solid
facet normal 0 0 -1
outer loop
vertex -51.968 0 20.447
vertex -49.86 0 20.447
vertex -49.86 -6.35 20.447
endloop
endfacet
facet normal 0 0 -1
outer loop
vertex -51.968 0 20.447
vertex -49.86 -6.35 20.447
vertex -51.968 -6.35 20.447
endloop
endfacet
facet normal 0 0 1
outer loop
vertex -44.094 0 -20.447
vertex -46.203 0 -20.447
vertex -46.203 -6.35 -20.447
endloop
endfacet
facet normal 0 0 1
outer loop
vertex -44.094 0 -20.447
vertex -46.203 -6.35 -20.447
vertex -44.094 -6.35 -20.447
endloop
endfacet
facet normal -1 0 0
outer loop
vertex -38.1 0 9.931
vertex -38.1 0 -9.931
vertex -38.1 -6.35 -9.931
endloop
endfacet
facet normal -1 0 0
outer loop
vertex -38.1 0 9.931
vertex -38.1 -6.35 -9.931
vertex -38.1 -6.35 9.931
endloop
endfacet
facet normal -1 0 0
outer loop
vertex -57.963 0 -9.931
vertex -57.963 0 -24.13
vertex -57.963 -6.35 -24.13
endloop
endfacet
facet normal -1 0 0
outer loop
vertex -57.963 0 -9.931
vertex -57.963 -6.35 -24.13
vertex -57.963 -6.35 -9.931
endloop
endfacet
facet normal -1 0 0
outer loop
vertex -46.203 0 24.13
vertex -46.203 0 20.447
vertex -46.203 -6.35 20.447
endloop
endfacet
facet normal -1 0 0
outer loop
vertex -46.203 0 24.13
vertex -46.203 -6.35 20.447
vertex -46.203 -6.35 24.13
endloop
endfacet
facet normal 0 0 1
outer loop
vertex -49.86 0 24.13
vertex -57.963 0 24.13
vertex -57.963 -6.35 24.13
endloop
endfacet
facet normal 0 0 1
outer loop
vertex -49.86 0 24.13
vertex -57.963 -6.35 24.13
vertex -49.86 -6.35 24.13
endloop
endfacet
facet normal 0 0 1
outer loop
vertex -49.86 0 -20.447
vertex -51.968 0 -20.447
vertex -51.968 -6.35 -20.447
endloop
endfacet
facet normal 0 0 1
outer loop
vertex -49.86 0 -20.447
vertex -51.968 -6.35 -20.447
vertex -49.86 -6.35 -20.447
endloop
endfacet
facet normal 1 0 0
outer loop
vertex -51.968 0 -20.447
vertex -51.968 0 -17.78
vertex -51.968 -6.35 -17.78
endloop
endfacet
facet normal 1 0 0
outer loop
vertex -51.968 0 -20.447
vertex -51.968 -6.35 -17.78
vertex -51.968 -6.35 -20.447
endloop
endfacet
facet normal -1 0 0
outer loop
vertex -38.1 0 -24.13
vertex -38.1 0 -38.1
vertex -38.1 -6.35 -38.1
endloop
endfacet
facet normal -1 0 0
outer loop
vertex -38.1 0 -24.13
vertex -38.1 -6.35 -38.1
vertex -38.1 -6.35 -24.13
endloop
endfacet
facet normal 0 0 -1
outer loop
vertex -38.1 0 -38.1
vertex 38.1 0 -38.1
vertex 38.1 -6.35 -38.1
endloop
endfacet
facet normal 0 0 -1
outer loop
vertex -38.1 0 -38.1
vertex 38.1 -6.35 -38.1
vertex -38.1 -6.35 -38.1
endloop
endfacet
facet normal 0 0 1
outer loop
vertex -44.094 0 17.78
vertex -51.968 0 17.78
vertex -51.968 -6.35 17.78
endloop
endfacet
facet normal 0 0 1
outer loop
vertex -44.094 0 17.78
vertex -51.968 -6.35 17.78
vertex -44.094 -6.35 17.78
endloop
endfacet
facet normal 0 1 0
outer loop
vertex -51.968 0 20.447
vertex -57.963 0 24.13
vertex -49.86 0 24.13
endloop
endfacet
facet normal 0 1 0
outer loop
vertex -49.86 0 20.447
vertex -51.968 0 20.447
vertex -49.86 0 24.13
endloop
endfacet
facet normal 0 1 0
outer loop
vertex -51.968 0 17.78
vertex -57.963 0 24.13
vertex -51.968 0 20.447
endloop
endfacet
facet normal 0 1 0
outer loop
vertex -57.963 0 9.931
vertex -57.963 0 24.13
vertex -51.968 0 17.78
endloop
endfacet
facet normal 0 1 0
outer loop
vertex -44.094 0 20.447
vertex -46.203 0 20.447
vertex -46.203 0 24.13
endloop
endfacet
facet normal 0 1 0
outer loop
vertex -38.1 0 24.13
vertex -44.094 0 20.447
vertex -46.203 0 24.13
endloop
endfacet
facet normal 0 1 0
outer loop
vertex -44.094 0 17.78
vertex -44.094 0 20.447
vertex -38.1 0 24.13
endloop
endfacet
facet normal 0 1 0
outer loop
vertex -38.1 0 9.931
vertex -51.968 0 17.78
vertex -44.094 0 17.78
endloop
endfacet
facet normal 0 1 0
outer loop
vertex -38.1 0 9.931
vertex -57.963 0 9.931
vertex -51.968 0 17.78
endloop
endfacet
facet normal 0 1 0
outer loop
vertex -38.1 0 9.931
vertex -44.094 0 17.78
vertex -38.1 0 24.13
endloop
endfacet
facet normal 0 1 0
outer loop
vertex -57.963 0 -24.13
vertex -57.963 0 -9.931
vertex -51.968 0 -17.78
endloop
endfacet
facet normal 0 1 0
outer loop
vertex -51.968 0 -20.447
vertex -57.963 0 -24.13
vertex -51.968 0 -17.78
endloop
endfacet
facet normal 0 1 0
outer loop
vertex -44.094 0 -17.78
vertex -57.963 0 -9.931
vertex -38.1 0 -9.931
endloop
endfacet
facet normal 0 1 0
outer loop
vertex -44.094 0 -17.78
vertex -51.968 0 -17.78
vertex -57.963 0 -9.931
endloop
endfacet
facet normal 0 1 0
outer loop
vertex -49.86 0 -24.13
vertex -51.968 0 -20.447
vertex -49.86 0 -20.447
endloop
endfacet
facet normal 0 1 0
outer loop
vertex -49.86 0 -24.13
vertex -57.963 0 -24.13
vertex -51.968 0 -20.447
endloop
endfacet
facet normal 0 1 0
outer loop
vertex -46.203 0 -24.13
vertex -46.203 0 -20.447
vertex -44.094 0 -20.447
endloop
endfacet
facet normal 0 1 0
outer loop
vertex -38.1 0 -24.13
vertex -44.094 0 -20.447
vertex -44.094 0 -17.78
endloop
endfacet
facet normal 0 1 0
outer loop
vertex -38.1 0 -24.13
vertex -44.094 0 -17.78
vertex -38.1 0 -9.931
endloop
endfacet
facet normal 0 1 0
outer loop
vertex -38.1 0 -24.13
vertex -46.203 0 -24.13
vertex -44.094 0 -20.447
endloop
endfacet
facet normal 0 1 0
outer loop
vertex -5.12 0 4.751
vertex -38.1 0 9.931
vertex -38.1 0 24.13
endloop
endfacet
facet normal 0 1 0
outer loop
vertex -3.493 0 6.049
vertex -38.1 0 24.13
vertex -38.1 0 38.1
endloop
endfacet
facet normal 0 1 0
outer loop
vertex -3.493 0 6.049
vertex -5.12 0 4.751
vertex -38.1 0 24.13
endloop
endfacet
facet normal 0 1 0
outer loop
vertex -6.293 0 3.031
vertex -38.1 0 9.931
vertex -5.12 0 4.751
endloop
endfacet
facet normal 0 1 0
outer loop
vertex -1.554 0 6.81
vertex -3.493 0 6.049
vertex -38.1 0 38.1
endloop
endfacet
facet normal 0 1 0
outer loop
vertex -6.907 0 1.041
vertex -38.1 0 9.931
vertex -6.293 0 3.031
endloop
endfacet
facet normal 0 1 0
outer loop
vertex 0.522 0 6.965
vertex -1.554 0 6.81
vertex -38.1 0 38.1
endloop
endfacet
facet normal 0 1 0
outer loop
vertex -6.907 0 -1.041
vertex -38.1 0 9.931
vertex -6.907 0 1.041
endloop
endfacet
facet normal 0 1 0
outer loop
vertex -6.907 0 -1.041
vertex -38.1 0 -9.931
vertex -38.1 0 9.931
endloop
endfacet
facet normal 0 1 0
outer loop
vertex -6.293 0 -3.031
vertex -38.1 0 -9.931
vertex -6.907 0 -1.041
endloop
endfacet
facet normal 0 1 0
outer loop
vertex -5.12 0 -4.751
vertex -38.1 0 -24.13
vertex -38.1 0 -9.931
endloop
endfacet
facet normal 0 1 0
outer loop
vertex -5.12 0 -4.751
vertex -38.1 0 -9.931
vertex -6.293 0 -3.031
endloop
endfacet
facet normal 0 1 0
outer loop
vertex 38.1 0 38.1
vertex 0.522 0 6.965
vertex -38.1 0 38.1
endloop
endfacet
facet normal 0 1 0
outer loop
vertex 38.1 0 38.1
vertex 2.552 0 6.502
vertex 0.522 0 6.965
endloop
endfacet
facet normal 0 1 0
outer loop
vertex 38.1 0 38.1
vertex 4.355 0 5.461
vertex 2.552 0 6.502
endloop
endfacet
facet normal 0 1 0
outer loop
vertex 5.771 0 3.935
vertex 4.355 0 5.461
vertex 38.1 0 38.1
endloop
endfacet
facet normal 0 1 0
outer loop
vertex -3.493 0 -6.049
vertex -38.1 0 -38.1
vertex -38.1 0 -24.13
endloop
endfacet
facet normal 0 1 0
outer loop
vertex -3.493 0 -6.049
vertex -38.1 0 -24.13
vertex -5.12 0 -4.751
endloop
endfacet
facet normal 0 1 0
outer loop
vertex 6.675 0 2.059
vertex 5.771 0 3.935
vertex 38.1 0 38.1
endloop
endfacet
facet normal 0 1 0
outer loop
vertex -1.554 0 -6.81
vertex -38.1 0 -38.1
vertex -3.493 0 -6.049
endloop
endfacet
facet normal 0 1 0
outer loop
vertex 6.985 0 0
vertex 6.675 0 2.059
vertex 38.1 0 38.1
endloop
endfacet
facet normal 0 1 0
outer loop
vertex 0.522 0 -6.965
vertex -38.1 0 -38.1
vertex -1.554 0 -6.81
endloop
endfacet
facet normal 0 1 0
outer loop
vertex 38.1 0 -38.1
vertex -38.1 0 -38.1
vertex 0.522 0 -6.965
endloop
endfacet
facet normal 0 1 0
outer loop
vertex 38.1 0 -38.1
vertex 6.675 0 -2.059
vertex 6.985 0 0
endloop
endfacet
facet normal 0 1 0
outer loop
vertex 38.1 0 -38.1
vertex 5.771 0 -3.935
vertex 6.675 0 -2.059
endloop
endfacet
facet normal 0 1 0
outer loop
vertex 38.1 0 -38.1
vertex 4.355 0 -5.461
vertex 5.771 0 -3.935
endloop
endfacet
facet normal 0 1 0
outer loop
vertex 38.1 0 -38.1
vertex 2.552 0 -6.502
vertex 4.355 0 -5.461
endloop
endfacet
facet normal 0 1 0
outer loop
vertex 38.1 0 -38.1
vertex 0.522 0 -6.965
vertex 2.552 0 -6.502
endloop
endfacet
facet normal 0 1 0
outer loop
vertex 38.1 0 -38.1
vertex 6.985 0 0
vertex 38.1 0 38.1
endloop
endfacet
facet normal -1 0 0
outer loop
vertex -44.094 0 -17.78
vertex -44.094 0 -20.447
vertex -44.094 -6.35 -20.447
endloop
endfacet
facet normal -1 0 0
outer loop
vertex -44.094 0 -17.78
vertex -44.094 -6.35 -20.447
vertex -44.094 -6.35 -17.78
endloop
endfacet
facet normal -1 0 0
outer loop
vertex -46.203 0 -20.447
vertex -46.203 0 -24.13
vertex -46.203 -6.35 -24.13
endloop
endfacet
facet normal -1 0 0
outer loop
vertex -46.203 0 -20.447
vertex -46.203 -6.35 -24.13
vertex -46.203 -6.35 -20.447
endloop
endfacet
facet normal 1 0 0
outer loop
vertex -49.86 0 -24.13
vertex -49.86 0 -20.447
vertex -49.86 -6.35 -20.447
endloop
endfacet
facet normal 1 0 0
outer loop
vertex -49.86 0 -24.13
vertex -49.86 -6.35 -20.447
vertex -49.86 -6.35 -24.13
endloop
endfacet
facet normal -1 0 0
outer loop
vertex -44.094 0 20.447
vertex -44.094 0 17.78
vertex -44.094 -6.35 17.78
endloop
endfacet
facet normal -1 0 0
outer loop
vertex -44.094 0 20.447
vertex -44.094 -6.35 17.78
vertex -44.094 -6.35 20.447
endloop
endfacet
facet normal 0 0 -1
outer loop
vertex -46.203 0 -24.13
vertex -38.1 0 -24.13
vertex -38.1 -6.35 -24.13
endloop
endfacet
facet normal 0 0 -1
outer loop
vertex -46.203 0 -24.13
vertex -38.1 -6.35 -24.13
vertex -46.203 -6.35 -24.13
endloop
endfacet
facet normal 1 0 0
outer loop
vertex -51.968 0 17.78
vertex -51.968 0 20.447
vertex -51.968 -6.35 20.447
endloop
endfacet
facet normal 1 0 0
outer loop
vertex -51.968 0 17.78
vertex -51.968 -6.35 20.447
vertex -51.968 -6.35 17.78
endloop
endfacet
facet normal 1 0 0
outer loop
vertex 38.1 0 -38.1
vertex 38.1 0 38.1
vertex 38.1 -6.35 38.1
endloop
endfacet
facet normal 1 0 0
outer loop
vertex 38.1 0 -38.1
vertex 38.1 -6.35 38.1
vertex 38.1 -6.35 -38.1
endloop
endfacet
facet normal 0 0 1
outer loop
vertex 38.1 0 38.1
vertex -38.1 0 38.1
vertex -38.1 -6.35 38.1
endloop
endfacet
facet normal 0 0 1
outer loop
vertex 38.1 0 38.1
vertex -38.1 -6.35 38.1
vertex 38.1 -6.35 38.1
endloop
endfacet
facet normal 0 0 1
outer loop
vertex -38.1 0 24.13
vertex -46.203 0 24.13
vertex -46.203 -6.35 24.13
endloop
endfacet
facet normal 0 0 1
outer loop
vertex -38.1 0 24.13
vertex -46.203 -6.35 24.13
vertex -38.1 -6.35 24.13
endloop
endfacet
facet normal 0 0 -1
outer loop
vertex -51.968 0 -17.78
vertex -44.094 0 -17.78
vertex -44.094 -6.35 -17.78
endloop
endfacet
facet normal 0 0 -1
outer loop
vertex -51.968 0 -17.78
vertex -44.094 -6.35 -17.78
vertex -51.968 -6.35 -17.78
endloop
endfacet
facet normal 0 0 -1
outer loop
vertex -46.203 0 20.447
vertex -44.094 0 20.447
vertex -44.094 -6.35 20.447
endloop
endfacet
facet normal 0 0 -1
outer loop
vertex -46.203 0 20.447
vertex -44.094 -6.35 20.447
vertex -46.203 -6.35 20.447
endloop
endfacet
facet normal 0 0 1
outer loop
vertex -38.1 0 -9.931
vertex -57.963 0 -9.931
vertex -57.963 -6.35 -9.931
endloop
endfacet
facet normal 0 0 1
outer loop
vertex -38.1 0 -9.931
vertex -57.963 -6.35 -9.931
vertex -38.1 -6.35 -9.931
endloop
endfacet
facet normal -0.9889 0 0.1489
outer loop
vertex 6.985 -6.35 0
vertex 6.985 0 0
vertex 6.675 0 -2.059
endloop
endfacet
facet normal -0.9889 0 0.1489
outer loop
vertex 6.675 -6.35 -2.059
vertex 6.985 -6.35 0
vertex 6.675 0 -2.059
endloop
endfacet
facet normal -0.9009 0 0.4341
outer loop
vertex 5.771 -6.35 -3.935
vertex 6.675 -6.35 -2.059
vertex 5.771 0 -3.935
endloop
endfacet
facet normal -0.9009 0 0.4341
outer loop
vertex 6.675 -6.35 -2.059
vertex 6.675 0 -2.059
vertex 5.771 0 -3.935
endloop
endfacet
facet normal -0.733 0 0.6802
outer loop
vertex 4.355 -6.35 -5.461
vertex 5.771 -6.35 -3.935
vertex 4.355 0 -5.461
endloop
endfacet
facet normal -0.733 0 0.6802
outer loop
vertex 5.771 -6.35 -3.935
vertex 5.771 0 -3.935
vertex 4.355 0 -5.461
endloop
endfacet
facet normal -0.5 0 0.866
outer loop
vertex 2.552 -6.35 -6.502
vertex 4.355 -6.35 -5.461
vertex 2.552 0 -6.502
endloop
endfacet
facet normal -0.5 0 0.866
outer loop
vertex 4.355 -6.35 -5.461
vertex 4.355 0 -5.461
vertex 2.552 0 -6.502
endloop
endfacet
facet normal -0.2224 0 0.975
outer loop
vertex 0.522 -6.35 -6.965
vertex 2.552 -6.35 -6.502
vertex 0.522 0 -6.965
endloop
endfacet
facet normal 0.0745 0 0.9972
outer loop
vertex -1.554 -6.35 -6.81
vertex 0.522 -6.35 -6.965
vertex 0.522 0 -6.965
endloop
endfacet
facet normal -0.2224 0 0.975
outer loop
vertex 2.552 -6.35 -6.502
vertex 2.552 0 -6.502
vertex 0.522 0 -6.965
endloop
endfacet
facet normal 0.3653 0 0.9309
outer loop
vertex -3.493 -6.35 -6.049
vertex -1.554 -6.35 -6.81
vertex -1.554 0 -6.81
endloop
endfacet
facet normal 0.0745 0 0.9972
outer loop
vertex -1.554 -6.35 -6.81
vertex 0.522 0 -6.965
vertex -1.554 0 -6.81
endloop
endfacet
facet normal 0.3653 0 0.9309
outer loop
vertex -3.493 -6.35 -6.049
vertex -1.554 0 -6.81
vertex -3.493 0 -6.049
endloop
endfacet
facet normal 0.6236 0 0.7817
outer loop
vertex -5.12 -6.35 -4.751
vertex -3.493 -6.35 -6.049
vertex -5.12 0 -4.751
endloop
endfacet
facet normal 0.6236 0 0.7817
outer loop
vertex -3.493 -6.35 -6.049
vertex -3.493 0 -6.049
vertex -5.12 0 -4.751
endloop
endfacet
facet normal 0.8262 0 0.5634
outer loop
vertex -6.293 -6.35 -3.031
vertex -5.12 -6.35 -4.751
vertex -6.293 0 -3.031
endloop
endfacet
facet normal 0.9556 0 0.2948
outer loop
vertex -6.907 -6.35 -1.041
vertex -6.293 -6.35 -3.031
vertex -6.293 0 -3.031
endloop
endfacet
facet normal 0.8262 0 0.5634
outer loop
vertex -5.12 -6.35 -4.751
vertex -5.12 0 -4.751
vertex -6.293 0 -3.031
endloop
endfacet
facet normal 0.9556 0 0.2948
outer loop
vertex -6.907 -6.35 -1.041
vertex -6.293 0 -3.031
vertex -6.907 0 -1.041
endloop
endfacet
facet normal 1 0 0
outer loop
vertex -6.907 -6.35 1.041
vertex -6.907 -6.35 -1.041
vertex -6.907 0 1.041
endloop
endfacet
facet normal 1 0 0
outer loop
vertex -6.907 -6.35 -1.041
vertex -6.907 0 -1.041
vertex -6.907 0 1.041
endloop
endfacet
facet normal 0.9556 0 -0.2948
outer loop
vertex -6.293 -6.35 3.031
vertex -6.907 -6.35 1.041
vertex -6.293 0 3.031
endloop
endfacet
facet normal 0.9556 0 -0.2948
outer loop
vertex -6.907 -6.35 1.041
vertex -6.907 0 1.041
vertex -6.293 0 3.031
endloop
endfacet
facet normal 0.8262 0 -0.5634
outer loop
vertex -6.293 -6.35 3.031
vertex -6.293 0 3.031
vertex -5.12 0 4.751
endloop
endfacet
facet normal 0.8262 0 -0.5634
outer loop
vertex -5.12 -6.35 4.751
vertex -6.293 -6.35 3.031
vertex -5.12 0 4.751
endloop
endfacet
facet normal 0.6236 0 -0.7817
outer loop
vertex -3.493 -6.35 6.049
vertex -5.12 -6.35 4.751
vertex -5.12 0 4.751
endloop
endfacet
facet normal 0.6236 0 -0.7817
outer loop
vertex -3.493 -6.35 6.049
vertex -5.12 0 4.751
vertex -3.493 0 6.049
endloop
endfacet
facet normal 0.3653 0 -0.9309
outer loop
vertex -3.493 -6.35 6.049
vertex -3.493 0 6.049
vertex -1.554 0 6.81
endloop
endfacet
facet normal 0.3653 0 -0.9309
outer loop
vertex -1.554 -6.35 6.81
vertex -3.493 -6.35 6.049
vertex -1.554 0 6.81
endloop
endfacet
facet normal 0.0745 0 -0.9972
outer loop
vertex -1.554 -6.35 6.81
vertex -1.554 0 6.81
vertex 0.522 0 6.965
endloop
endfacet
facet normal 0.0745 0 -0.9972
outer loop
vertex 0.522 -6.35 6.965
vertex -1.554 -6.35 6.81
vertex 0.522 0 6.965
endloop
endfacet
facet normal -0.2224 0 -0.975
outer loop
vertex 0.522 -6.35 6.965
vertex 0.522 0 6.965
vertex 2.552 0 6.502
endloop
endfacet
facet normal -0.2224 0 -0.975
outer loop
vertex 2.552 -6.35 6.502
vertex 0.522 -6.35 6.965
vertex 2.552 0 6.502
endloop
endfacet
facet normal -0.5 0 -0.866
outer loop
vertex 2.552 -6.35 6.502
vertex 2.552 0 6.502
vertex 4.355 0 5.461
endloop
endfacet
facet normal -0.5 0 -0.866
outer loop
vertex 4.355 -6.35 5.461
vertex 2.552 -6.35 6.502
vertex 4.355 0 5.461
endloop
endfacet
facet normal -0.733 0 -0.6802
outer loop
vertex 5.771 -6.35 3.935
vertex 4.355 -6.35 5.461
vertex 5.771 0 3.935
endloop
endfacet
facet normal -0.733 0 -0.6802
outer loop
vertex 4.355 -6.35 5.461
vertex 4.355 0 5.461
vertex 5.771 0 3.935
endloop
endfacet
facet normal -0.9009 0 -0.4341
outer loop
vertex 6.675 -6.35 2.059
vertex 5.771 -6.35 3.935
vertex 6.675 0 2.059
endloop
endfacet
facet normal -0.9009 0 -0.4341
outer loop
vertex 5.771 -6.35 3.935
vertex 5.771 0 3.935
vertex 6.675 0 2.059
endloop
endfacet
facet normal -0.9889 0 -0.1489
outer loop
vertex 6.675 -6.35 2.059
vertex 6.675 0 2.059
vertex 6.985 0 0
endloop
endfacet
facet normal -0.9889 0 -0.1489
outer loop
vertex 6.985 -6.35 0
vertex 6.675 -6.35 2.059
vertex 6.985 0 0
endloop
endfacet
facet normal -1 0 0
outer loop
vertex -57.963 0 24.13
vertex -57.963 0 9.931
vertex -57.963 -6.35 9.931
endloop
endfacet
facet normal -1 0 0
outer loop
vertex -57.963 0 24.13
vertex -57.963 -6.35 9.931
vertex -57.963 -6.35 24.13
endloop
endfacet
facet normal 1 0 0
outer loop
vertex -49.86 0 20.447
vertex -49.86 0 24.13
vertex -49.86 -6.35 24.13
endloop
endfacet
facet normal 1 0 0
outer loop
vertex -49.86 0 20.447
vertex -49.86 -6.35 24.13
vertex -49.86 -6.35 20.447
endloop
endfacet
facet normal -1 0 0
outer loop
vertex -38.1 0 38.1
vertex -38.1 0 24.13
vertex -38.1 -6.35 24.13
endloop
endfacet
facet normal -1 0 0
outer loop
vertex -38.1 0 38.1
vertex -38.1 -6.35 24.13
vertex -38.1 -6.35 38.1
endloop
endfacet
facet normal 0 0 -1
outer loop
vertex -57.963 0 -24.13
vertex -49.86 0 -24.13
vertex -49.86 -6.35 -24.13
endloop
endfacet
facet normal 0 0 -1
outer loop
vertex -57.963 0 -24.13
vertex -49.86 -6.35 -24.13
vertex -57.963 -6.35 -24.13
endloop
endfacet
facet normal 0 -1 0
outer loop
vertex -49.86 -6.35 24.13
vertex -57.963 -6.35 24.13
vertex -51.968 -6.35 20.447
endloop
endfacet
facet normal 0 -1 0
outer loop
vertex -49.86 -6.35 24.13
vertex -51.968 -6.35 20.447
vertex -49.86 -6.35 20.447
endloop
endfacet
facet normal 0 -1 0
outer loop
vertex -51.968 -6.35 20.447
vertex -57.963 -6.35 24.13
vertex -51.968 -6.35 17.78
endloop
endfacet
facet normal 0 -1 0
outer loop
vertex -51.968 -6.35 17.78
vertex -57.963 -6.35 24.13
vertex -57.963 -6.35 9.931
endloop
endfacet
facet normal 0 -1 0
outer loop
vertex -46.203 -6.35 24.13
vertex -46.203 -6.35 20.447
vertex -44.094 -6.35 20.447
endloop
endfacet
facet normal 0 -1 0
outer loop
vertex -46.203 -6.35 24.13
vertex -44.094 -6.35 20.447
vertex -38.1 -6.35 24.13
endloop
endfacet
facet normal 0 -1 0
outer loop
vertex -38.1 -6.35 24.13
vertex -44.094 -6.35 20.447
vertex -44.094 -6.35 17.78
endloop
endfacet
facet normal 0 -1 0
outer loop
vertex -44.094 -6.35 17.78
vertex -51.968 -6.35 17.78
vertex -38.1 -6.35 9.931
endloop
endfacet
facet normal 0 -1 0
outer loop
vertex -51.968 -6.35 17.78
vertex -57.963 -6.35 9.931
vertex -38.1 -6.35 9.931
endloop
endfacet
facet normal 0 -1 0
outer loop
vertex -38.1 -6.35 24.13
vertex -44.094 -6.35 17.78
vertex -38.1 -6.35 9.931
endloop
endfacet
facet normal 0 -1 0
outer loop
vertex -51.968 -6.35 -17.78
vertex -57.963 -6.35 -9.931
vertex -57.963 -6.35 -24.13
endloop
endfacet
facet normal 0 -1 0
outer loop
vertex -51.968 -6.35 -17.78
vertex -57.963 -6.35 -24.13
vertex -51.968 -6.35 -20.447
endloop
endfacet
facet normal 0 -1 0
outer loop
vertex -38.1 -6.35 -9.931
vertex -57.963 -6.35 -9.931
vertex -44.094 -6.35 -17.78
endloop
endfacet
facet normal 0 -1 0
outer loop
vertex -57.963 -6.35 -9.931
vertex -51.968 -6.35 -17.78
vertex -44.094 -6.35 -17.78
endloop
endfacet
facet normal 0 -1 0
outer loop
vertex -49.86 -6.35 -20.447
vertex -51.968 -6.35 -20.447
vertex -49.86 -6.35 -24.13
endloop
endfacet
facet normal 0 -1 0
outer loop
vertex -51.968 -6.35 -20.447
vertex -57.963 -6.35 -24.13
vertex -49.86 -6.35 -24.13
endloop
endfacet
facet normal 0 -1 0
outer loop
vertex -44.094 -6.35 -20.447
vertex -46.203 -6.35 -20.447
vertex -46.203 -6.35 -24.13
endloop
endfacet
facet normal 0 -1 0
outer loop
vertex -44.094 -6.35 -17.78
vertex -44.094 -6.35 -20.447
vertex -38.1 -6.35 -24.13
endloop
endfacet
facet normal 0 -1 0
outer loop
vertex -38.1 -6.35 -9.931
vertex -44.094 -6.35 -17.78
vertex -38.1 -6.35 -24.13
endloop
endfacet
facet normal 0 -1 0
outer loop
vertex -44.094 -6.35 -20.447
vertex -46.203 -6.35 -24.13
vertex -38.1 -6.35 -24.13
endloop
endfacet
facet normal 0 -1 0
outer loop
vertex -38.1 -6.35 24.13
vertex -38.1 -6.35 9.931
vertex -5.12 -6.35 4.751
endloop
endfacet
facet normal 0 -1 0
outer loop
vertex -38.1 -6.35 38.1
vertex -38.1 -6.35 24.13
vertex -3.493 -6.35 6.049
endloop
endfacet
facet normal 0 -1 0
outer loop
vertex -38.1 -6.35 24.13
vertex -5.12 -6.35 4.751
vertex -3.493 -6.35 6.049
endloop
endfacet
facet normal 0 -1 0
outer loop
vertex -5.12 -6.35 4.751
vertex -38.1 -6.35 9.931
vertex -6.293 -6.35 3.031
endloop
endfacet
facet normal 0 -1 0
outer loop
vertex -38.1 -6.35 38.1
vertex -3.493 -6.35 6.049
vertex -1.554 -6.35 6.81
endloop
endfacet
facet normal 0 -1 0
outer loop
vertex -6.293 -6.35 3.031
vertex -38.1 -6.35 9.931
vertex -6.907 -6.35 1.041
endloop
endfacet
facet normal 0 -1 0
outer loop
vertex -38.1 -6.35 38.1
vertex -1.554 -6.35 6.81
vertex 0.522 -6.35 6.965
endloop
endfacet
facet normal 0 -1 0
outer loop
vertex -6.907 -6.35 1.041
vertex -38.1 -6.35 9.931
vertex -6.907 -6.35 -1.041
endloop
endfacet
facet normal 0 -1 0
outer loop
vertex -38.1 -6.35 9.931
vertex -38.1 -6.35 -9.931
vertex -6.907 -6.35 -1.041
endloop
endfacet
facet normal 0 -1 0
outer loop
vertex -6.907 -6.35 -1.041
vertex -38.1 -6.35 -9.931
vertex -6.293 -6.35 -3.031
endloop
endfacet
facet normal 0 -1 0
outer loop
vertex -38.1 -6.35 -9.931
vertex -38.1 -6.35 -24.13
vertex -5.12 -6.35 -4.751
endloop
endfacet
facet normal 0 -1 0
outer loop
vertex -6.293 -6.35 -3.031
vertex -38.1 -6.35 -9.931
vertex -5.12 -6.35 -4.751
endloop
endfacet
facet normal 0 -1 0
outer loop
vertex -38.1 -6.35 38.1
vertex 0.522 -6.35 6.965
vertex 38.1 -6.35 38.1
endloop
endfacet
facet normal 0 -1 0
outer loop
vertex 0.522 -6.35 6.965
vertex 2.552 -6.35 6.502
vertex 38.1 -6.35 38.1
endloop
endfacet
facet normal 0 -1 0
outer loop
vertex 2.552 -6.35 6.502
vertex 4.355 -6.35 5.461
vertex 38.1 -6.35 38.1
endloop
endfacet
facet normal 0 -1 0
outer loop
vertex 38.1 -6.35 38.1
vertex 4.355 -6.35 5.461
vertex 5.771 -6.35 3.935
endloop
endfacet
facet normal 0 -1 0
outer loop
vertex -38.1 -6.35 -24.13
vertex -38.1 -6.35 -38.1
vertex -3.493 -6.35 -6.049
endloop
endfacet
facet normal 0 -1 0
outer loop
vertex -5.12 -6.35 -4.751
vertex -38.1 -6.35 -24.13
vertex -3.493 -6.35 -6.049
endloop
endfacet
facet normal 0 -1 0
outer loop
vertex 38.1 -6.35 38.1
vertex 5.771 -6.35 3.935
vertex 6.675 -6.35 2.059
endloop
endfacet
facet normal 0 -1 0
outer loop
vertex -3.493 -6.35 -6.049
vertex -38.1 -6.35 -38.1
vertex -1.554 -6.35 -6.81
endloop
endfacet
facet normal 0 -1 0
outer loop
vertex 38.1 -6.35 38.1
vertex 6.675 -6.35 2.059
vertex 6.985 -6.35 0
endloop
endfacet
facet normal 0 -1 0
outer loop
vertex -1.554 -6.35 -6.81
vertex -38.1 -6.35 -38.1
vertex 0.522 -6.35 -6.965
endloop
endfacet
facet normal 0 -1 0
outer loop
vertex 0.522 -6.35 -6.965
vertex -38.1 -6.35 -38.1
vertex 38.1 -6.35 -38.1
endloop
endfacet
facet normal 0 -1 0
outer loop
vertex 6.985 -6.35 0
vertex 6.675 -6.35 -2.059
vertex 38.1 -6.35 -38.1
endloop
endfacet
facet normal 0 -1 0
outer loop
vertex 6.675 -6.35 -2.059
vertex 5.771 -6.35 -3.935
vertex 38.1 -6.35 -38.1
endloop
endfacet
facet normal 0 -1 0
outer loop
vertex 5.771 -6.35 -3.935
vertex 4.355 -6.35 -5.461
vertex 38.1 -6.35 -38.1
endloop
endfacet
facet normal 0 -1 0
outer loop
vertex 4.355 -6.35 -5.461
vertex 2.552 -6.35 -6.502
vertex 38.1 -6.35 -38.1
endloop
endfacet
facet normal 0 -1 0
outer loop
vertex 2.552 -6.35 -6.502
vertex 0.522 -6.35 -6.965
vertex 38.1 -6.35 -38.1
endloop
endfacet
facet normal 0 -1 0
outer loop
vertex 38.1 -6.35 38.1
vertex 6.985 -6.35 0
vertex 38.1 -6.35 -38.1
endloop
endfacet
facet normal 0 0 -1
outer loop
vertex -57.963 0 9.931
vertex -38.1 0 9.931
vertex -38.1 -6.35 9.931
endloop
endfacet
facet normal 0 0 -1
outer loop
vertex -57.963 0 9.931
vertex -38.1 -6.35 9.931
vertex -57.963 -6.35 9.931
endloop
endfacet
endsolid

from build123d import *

# Parameters (mm, degrees)
SKETCH1_R           = 6.985
BOSS_EXTRUDE1_DEPTH = 6.35


with BuildPart() as part:
    # Sketch1 → Boss-Extrude1 (new body)
    with BuildSketch(Plane(origin=(0, 0, 0), x_dir=(1, 0, 0), z_dir=(0, 1, 0))):
        Polygon((-38.1, -38.1), (38.1, -38.1), (38.1, 38.1), (-38.1, 38.1), (-38.1, 24.13), (-46.2026, 24.13), (-46.2026, 20.447), (-44.0944, 20.447), (-44.0944, 17.78), (-51.9684, 17.78), (-51.9684, 20.447), (-49.8602, 20.447), (-49.8602, 24.13), (-57.9628, 24.13), (-57.9628, 9.9314), (-38.1, 9.9314), (-38.1, -9.9314), (-57.9628, -9.9314), (-57.9628, -24.13), (-49.8602, -24.13), (-49.8602, -20.447), (-51.9684, -20.447), (-51.9684, -17.78), (-44.0944, -17.78), (-44.0944, -20.447), (-46.2026, -20.447), (-46.2026, -24.13), (-38.1, -24.13), align=None)
        Circle(SKETCH1_R, mode=Mode.SUBTRACT)
    extrude(amount=-BOSS_EXTRUDE1_DEPTH)


solid = part.part
